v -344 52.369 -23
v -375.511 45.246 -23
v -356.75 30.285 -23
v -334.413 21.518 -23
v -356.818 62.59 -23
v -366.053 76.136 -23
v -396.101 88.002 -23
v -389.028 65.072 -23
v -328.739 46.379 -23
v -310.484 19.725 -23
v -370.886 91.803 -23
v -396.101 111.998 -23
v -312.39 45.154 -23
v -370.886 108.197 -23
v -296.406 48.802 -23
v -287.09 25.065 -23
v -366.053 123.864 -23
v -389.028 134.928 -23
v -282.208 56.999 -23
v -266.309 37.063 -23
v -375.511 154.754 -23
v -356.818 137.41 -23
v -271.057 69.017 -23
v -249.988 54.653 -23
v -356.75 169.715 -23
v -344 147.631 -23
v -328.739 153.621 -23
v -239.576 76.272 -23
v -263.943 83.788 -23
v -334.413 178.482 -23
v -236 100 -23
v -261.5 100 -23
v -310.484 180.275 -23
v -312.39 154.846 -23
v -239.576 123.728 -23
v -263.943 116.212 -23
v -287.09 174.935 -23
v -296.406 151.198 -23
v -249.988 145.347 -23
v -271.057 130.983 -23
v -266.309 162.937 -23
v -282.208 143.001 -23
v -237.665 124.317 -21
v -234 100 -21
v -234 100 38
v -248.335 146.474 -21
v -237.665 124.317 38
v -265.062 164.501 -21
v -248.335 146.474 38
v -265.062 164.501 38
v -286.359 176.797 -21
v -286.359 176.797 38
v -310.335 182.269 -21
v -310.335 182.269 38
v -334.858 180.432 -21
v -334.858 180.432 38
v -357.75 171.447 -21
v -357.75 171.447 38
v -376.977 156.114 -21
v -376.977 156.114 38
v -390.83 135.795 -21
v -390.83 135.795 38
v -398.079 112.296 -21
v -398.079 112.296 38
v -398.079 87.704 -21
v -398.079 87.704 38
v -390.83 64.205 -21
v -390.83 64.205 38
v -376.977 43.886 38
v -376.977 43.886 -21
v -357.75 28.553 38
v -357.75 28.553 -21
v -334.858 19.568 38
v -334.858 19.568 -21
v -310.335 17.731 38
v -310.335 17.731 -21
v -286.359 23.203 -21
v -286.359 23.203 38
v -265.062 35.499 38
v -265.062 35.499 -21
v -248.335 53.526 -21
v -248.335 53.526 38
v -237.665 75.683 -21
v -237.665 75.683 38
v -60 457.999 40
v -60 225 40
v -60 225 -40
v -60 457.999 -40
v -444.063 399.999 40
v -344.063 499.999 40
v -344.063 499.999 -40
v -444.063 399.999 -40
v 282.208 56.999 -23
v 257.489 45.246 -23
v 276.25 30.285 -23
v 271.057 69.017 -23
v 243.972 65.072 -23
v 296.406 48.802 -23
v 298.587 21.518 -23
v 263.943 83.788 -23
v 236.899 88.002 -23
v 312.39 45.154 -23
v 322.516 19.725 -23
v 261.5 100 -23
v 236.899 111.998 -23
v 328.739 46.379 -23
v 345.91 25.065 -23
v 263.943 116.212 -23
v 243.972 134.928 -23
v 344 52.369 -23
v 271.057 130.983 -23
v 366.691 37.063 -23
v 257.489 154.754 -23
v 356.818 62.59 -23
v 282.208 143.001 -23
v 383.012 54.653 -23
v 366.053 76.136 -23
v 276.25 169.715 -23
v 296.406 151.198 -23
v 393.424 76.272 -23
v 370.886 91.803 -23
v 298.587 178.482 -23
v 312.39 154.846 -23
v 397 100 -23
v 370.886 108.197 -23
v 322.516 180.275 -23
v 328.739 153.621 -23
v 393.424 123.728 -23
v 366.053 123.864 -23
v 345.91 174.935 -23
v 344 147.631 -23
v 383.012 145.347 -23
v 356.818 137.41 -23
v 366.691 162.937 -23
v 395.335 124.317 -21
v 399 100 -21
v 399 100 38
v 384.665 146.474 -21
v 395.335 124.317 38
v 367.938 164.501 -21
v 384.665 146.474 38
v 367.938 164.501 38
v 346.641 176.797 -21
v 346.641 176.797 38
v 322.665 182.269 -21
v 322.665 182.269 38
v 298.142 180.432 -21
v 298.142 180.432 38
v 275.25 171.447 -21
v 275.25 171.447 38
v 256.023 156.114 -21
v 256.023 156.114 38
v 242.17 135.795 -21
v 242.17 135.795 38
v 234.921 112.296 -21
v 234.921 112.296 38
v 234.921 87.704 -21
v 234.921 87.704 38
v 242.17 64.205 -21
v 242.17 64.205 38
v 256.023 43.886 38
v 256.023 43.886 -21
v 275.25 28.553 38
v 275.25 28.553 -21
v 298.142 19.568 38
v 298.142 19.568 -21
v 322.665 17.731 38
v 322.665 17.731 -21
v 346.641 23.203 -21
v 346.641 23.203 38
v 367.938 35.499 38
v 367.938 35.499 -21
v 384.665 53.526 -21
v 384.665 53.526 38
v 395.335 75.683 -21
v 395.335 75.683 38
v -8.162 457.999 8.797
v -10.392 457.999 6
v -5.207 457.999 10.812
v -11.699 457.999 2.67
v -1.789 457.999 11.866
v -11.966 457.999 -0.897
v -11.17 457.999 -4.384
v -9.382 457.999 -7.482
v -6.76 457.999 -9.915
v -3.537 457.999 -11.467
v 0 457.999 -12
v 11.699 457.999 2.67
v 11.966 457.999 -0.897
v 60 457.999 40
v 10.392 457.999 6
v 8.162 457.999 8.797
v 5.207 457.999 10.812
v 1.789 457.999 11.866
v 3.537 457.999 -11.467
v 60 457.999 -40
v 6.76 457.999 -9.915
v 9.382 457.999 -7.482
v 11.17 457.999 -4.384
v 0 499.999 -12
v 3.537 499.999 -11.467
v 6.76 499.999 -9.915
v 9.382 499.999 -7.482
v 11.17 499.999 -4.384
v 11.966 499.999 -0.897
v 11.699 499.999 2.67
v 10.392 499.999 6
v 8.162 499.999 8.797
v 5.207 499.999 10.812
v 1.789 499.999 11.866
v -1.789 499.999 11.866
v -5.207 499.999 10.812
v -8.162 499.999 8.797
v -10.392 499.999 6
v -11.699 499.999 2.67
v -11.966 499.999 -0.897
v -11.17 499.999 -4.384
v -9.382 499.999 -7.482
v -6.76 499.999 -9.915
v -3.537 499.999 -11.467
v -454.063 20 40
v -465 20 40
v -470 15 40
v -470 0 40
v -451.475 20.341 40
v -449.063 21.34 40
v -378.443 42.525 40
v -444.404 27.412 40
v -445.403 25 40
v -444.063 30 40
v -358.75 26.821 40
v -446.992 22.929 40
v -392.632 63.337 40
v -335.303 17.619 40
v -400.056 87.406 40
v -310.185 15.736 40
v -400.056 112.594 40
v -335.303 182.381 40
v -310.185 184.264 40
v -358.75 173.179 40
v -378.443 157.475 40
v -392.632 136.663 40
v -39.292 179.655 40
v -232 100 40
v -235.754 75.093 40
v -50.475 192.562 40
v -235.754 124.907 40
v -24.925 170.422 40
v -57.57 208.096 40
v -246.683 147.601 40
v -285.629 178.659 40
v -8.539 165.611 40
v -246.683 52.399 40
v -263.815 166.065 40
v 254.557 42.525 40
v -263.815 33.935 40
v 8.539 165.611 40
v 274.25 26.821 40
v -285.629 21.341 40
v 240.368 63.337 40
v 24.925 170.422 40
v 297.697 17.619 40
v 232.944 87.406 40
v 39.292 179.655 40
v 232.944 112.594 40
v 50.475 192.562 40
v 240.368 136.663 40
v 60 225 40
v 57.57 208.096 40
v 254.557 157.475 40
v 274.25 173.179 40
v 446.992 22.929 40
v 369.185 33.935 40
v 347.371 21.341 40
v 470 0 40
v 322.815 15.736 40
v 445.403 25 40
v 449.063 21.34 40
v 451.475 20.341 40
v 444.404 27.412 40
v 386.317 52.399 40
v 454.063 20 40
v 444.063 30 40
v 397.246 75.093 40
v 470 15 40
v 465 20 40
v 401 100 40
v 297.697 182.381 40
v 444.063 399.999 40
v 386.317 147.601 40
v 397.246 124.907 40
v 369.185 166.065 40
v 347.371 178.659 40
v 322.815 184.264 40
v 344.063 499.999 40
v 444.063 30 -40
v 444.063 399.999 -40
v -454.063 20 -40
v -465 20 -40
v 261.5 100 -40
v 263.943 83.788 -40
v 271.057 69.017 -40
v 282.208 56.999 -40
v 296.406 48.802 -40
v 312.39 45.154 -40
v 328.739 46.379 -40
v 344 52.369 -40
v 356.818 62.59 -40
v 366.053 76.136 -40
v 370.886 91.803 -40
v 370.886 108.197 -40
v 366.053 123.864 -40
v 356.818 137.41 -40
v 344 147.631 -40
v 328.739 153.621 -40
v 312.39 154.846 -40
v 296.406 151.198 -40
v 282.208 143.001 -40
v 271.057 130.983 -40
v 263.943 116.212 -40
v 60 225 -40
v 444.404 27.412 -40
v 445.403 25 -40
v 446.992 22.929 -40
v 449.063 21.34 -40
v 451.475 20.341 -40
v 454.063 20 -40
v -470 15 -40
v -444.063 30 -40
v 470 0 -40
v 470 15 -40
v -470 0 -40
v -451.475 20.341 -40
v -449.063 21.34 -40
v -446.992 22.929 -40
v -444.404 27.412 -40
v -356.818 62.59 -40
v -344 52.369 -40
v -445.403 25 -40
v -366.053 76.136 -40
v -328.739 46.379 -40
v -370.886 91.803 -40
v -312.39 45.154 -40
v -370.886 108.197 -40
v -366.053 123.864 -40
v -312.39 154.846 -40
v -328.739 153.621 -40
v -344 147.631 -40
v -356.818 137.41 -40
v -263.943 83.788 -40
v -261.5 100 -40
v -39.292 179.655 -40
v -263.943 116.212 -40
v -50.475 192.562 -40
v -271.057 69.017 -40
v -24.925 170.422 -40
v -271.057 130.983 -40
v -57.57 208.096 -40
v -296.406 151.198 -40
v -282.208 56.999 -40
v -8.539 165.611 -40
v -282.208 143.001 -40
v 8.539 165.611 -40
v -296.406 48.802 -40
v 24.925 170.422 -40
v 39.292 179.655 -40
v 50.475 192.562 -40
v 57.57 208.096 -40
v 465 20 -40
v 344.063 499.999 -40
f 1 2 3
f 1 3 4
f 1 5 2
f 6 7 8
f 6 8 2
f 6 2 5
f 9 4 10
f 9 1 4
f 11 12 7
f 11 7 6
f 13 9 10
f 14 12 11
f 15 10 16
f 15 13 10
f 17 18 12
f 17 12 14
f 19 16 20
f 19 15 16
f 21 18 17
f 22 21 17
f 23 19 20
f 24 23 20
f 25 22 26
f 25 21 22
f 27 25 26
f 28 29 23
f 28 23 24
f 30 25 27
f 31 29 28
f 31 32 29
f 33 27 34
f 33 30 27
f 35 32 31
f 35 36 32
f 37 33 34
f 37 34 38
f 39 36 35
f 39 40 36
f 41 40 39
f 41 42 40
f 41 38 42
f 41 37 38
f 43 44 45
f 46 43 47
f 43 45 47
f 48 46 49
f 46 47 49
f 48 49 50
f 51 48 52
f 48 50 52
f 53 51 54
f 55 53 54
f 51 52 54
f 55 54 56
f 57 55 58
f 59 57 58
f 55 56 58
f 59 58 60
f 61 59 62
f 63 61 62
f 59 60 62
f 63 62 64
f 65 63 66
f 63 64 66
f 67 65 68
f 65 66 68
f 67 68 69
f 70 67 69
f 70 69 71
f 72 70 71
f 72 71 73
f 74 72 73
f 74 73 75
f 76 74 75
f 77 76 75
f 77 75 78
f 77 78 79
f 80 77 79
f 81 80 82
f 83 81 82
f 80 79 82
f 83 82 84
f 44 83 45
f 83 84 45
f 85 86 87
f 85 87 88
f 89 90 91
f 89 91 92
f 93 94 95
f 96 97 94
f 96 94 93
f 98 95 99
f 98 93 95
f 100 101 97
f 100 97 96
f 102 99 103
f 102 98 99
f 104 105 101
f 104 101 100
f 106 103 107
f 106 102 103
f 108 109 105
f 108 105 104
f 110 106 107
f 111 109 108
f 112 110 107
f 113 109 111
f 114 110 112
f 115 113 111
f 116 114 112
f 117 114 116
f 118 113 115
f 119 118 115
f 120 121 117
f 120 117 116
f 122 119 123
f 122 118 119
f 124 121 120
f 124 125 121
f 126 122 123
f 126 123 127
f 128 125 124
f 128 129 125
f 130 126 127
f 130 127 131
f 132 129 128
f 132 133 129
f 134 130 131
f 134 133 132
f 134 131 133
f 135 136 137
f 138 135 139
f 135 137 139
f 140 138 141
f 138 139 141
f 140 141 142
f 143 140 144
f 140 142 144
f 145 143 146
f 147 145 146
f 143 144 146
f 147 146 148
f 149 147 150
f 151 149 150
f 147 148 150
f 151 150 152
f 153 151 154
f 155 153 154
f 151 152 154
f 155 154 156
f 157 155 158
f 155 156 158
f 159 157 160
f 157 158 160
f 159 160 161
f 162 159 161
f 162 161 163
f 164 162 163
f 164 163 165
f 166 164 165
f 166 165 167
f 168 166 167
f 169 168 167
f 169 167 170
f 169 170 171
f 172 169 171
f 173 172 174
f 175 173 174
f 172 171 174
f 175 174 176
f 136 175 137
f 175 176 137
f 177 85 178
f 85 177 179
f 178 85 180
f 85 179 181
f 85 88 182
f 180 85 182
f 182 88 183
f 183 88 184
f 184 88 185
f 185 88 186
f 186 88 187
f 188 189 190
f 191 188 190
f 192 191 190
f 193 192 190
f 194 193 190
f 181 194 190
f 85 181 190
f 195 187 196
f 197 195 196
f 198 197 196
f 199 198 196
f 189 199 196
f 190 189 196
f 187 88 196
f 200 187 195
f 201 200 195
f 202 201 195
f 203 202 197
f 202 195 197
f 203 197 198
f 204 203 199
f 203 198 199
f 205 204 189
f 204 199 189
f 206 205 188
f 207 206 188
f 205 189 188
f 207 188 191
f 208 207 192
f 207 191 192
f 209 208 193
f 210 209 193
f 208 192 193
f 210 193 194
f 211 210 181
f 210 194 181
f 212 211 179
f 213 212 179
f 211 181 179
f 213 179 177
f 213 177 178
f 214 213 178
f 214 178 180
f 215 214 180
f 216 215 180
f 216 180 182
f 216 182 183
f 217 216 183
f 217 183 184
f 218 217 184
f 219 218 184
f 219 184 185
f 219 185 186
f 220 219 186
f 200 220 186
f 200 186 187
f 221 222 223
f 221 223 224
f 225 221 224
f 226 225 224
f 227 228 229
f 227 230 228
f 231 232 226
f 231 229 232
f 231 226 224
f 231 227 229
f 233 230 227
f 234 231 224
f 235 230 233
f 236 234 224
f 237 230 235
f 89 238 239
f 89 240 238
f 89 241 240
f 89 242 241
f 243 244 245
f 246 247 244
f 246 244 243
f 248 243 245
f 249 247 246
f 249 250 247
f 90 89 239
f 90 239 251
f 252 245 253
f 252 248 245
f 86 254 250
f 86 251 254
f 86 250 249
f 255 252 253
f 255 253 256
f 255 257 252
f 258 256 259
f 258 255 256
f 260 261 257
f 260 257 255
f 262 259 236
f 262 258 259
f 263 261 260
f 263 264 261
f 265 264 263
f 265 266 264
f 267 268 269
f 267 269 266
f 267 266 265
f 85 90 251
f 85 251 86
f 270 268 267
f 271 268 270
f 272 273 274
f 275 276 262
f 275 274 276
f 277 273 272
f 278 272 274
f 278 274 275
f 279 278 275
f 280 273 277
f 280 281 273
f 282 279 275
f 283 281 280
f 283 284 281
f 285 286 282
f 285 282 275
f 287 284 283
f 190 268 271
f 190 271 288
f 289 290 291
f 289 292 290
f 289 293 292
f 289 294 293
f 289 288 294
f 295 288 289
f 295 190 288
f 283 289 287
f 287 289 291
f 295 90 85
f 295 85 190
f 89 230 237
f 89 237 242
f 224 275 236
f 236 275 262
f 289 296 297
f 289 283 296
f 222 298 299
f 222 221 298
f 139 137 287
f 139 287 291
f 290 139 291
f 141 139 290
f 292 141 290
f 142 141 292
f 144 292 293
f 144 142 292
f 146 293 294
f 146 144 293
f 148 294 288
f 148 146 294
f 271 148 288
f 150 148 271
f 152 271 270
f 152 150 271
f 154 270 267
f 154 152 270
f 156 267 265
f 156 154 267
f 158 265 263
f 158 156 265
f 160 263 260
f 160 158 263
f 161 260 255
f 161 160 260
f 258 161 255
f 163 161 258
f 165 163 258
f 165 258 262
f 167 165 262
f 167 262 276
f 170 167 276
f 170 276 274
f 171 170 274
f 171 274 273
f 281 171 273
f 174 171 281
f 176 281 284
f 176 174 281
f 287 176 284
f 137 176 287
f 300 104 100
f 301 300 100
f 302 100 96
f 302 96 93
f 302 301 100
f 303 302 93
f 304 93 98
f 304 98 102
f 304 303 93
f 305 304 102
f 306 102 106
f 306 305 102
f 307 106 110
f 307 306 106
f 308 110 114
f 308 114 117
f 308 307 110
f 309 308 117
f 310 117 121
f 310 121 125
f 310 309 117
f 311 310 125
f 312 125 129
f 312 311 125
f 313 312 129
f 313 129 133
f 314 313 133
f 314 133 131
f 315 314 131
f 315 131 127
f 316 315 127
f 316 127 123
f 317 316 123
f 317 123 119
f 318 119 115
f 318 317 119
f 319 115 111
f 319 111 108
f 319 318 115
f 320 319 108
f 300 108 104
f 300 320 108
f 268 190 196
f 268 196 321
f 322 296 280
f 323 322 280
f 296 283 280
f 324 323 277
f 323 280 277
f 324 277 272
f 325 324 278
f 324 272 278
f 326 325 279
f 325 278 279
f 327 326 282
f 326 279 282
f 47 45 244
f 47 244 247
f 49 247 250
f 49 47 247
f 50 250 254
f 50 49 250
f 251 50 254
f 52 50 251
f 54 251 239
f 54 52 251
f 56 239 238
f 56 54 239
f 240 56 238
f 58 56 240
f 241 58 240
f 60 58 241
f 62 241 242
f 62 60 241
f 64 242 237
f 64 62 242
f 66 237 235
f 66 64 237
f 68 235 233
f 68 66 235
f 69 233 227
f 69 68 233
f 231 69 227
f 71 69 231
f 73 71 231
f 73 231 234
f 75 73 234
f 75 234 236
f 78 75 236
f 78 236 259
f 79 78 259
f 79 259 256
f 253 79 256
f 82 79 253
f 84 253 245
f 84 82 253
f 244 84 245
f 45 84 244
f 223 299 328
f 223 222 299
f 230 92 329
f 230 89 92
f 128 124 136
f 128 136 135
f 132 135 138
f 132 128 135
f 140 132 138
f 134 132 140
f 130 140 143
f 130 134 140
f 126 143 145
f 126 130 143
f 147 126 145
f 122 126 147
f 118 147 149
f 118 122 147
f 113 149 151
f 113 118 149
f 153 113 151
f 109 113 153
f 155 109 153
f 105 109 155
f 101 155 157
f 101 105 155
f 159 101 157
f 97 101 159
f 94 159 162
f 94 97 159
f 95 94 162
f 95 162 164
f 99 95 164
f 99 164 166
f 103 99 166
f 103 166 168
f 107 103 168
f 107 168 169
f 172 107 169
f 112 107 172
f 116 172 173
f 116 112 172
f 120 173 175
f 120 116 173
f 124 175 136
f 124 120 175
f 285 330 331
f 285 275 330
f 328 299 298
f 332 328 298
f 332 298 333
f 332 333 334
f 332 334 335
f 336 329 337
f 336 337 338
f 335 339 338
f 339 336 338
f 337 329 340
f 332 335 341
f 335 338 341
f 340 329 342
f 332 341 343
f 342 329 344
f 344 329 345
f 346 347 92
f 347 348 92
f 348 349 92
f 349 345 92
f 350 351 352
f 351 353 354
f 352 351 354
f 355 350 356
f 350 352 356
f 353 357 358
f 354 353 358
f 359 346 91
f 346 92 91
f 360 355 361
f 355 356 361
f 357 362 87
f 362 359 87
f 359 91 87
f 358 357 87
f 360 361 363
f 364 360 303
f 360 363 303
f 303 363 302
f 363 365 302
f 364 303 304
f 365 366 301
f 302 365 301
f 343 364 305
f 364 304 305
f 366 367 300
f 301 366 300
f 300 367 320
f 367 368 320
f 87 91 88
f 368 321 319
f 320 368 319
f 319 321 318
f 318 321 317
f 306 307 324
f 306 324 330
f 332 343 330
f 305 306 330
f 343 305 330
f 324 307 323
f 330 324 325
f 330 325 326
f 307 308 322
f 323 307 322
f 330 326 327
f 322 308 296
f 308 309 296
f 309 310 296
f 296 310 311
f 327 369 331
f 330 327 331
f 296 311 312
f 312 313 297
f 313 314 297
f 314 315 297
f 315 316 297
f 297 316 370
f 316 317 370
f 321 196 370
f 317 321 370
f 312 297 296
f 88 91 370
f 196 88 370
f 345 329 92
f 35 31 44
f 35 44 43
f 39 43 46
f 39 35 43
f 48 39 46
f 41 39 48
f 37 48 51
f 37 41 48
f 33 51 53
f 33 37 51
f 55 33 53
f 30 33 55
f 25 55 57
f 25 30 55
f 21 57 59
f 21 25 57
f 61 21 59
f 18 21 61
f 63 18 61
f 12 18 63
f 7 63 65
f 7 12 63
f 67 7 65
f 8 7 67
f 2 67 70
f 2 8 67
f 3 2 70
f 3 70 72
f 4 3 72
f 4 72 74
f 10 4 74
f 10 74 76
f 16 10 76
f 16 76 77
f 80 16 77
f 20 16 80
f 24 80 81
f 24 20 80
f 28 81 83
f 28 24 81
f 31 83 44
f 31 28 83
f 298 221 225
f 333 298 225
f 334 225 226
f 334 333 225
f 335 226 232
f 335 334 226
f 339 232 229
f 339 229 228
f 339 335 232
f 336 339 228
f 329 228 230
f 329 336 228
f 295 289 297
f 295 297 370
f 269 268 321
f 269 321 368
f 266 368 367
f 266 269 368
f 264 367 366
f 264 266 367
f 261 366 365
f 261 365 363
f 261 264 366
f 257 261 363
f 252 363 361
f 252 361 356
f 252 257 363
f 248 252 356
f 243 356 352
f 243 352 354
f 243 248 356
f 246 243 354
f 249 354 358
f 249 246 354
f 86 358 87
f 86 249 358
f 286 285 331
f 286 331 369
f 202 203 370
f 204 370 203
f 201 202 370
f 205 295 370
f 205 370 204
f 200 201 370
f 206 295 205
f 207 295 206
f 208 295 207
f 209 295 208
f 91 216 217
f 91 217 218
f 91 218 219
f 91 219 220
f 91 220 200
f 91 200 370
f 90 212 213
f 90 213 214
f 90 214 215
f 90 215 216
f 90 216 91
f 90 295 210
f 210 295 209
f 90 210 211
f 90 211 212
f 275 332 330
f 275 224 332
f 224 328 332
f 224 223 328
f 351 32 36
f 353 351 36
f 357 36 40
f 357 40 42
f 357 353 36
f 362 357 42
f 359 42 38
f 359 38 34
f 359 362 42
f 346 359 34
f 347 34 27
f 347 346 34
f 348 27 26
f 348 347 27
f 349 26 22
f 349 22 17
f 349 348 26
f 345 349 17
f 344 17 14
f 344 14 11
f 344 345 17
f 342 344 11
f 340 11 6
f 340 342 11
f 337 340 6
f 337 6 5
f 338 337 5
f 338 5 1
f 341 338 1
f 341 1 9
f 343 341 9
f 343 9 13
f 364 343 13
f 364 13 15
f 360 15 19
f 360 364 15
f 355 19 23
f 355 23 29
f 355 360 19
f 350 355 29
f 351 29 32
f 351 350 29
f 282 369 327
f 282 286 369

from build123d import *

# Parameters (mm, degrees)
SKETCH1_R           = 55
BOSS_EXTRUDE1_DEPTH = 40
FILLET1_R           = 10
SKETCH2_R           = 12
CUT_EXTRUDE1_DEPTH  = 658.467258663
SKETCH3_R           = 82.5
SKETCH3_R_2         = 55
CUT_EXTRUDE2_DEPTH  = 63
CHAMFER1_SIZE       = 2


with BuildPart() as part:
    # Sketch1 → Boss-Extrude1 (new, symmetric)
    with BuildSketch(Plane.XY):
        Polygon((-445, 0), (445, 0), (470, 0), (470, 15), (465, 20), (444.063252294, 20), (444.063252294, 399.999122503), (344.063252294, 499.999122503), (-344.063252294, 499.999122503), (-444.063252294, 399.999122503), (-444.063252294, 20), (-465, 20), (-470, 15), (-470, 0), align=None)
        with Locations((-316.5, 100)):
            Circle(SKETCH1_R, mode=Mode.SUBTRACT)
        with Locations(Location((316.5, 100, 0), (0, 0, 180))):
            Circle(SKETCH1_R, mode=Mode.SUBTRACT)
        with BuildLine():
            Line((-60, 457.999122503), (60, 457.999122503))
            Line((60, 457.999122503), (60, 225))
            ThreePointArc((60, 225), (0, 165), (-60, 225))
            Line((-60, 225), (-60, 457.999122503))
        make_face(mode=Mode.SUBTRACT)
    extrude(amount=BOSS_EXTRUDE1_DEPTH, both=True)

    # Fillet1
    fillet1_edges = [part.edges().sort_by_distance(p)[0] for p in [
        (444.063252294, 20, 0),
        (-444.063252294, 20, 0),
    ]]
    fillet(fillet1_edges, radius=FILLET1_R)

    # Sketch2 → Cut-Extrude1 (cut, through all)
    with BuildSketch(Plane.XZ.offset(-457.999122503)):
        with Locations(Location((0, 0, 0), (0, 0, 270))):
            Circle(SKETCH2_R)
    extrude(amount=-CUT_EXTRUDE1_DEPTH, mode=Mode.SUBTRACT)

    # Sketch3 → Cut-Extrude2 (cut)
    # profile 1 of 2: a face of its own
    with BuildSketch(Plane.XY.offset(40)):
        with Locations((-316.5, 100)):
            Circle(SKETCH3_R)
        with Locations((-316.5, 100)):
            Circle(SKETCH3_R_2, mode=Mode.SUBTRACT)
    # profile 2 of 2: a face of its own
    with BuildSketch(Plane.XY.offset(40)):
        with Locations((316.5, 100)):
            Circle(SKETCH3_R)
        with Locations(Location((316.5, 100, 0), (0, 0, 180))):
            Circle(SKETCH3_R_2, mode=Mode.SUBTRACT)
    extrude(amount=-CUT_EXTRUDE2_DEPTH, mode=Mode.SUBTRACT)

    # Chamfer1
    chamfer1_edges = [part.edges().sort_by_distance(p)[0] for p in [
        (-399, 100, -23),
        (-399, 100, 40),
        (234, 100, -23),
        (234, 100, 40),
    ]]
    chamfer(chamfer1_edges, length=CHAMFER1_SIZE)


solid = part.part
